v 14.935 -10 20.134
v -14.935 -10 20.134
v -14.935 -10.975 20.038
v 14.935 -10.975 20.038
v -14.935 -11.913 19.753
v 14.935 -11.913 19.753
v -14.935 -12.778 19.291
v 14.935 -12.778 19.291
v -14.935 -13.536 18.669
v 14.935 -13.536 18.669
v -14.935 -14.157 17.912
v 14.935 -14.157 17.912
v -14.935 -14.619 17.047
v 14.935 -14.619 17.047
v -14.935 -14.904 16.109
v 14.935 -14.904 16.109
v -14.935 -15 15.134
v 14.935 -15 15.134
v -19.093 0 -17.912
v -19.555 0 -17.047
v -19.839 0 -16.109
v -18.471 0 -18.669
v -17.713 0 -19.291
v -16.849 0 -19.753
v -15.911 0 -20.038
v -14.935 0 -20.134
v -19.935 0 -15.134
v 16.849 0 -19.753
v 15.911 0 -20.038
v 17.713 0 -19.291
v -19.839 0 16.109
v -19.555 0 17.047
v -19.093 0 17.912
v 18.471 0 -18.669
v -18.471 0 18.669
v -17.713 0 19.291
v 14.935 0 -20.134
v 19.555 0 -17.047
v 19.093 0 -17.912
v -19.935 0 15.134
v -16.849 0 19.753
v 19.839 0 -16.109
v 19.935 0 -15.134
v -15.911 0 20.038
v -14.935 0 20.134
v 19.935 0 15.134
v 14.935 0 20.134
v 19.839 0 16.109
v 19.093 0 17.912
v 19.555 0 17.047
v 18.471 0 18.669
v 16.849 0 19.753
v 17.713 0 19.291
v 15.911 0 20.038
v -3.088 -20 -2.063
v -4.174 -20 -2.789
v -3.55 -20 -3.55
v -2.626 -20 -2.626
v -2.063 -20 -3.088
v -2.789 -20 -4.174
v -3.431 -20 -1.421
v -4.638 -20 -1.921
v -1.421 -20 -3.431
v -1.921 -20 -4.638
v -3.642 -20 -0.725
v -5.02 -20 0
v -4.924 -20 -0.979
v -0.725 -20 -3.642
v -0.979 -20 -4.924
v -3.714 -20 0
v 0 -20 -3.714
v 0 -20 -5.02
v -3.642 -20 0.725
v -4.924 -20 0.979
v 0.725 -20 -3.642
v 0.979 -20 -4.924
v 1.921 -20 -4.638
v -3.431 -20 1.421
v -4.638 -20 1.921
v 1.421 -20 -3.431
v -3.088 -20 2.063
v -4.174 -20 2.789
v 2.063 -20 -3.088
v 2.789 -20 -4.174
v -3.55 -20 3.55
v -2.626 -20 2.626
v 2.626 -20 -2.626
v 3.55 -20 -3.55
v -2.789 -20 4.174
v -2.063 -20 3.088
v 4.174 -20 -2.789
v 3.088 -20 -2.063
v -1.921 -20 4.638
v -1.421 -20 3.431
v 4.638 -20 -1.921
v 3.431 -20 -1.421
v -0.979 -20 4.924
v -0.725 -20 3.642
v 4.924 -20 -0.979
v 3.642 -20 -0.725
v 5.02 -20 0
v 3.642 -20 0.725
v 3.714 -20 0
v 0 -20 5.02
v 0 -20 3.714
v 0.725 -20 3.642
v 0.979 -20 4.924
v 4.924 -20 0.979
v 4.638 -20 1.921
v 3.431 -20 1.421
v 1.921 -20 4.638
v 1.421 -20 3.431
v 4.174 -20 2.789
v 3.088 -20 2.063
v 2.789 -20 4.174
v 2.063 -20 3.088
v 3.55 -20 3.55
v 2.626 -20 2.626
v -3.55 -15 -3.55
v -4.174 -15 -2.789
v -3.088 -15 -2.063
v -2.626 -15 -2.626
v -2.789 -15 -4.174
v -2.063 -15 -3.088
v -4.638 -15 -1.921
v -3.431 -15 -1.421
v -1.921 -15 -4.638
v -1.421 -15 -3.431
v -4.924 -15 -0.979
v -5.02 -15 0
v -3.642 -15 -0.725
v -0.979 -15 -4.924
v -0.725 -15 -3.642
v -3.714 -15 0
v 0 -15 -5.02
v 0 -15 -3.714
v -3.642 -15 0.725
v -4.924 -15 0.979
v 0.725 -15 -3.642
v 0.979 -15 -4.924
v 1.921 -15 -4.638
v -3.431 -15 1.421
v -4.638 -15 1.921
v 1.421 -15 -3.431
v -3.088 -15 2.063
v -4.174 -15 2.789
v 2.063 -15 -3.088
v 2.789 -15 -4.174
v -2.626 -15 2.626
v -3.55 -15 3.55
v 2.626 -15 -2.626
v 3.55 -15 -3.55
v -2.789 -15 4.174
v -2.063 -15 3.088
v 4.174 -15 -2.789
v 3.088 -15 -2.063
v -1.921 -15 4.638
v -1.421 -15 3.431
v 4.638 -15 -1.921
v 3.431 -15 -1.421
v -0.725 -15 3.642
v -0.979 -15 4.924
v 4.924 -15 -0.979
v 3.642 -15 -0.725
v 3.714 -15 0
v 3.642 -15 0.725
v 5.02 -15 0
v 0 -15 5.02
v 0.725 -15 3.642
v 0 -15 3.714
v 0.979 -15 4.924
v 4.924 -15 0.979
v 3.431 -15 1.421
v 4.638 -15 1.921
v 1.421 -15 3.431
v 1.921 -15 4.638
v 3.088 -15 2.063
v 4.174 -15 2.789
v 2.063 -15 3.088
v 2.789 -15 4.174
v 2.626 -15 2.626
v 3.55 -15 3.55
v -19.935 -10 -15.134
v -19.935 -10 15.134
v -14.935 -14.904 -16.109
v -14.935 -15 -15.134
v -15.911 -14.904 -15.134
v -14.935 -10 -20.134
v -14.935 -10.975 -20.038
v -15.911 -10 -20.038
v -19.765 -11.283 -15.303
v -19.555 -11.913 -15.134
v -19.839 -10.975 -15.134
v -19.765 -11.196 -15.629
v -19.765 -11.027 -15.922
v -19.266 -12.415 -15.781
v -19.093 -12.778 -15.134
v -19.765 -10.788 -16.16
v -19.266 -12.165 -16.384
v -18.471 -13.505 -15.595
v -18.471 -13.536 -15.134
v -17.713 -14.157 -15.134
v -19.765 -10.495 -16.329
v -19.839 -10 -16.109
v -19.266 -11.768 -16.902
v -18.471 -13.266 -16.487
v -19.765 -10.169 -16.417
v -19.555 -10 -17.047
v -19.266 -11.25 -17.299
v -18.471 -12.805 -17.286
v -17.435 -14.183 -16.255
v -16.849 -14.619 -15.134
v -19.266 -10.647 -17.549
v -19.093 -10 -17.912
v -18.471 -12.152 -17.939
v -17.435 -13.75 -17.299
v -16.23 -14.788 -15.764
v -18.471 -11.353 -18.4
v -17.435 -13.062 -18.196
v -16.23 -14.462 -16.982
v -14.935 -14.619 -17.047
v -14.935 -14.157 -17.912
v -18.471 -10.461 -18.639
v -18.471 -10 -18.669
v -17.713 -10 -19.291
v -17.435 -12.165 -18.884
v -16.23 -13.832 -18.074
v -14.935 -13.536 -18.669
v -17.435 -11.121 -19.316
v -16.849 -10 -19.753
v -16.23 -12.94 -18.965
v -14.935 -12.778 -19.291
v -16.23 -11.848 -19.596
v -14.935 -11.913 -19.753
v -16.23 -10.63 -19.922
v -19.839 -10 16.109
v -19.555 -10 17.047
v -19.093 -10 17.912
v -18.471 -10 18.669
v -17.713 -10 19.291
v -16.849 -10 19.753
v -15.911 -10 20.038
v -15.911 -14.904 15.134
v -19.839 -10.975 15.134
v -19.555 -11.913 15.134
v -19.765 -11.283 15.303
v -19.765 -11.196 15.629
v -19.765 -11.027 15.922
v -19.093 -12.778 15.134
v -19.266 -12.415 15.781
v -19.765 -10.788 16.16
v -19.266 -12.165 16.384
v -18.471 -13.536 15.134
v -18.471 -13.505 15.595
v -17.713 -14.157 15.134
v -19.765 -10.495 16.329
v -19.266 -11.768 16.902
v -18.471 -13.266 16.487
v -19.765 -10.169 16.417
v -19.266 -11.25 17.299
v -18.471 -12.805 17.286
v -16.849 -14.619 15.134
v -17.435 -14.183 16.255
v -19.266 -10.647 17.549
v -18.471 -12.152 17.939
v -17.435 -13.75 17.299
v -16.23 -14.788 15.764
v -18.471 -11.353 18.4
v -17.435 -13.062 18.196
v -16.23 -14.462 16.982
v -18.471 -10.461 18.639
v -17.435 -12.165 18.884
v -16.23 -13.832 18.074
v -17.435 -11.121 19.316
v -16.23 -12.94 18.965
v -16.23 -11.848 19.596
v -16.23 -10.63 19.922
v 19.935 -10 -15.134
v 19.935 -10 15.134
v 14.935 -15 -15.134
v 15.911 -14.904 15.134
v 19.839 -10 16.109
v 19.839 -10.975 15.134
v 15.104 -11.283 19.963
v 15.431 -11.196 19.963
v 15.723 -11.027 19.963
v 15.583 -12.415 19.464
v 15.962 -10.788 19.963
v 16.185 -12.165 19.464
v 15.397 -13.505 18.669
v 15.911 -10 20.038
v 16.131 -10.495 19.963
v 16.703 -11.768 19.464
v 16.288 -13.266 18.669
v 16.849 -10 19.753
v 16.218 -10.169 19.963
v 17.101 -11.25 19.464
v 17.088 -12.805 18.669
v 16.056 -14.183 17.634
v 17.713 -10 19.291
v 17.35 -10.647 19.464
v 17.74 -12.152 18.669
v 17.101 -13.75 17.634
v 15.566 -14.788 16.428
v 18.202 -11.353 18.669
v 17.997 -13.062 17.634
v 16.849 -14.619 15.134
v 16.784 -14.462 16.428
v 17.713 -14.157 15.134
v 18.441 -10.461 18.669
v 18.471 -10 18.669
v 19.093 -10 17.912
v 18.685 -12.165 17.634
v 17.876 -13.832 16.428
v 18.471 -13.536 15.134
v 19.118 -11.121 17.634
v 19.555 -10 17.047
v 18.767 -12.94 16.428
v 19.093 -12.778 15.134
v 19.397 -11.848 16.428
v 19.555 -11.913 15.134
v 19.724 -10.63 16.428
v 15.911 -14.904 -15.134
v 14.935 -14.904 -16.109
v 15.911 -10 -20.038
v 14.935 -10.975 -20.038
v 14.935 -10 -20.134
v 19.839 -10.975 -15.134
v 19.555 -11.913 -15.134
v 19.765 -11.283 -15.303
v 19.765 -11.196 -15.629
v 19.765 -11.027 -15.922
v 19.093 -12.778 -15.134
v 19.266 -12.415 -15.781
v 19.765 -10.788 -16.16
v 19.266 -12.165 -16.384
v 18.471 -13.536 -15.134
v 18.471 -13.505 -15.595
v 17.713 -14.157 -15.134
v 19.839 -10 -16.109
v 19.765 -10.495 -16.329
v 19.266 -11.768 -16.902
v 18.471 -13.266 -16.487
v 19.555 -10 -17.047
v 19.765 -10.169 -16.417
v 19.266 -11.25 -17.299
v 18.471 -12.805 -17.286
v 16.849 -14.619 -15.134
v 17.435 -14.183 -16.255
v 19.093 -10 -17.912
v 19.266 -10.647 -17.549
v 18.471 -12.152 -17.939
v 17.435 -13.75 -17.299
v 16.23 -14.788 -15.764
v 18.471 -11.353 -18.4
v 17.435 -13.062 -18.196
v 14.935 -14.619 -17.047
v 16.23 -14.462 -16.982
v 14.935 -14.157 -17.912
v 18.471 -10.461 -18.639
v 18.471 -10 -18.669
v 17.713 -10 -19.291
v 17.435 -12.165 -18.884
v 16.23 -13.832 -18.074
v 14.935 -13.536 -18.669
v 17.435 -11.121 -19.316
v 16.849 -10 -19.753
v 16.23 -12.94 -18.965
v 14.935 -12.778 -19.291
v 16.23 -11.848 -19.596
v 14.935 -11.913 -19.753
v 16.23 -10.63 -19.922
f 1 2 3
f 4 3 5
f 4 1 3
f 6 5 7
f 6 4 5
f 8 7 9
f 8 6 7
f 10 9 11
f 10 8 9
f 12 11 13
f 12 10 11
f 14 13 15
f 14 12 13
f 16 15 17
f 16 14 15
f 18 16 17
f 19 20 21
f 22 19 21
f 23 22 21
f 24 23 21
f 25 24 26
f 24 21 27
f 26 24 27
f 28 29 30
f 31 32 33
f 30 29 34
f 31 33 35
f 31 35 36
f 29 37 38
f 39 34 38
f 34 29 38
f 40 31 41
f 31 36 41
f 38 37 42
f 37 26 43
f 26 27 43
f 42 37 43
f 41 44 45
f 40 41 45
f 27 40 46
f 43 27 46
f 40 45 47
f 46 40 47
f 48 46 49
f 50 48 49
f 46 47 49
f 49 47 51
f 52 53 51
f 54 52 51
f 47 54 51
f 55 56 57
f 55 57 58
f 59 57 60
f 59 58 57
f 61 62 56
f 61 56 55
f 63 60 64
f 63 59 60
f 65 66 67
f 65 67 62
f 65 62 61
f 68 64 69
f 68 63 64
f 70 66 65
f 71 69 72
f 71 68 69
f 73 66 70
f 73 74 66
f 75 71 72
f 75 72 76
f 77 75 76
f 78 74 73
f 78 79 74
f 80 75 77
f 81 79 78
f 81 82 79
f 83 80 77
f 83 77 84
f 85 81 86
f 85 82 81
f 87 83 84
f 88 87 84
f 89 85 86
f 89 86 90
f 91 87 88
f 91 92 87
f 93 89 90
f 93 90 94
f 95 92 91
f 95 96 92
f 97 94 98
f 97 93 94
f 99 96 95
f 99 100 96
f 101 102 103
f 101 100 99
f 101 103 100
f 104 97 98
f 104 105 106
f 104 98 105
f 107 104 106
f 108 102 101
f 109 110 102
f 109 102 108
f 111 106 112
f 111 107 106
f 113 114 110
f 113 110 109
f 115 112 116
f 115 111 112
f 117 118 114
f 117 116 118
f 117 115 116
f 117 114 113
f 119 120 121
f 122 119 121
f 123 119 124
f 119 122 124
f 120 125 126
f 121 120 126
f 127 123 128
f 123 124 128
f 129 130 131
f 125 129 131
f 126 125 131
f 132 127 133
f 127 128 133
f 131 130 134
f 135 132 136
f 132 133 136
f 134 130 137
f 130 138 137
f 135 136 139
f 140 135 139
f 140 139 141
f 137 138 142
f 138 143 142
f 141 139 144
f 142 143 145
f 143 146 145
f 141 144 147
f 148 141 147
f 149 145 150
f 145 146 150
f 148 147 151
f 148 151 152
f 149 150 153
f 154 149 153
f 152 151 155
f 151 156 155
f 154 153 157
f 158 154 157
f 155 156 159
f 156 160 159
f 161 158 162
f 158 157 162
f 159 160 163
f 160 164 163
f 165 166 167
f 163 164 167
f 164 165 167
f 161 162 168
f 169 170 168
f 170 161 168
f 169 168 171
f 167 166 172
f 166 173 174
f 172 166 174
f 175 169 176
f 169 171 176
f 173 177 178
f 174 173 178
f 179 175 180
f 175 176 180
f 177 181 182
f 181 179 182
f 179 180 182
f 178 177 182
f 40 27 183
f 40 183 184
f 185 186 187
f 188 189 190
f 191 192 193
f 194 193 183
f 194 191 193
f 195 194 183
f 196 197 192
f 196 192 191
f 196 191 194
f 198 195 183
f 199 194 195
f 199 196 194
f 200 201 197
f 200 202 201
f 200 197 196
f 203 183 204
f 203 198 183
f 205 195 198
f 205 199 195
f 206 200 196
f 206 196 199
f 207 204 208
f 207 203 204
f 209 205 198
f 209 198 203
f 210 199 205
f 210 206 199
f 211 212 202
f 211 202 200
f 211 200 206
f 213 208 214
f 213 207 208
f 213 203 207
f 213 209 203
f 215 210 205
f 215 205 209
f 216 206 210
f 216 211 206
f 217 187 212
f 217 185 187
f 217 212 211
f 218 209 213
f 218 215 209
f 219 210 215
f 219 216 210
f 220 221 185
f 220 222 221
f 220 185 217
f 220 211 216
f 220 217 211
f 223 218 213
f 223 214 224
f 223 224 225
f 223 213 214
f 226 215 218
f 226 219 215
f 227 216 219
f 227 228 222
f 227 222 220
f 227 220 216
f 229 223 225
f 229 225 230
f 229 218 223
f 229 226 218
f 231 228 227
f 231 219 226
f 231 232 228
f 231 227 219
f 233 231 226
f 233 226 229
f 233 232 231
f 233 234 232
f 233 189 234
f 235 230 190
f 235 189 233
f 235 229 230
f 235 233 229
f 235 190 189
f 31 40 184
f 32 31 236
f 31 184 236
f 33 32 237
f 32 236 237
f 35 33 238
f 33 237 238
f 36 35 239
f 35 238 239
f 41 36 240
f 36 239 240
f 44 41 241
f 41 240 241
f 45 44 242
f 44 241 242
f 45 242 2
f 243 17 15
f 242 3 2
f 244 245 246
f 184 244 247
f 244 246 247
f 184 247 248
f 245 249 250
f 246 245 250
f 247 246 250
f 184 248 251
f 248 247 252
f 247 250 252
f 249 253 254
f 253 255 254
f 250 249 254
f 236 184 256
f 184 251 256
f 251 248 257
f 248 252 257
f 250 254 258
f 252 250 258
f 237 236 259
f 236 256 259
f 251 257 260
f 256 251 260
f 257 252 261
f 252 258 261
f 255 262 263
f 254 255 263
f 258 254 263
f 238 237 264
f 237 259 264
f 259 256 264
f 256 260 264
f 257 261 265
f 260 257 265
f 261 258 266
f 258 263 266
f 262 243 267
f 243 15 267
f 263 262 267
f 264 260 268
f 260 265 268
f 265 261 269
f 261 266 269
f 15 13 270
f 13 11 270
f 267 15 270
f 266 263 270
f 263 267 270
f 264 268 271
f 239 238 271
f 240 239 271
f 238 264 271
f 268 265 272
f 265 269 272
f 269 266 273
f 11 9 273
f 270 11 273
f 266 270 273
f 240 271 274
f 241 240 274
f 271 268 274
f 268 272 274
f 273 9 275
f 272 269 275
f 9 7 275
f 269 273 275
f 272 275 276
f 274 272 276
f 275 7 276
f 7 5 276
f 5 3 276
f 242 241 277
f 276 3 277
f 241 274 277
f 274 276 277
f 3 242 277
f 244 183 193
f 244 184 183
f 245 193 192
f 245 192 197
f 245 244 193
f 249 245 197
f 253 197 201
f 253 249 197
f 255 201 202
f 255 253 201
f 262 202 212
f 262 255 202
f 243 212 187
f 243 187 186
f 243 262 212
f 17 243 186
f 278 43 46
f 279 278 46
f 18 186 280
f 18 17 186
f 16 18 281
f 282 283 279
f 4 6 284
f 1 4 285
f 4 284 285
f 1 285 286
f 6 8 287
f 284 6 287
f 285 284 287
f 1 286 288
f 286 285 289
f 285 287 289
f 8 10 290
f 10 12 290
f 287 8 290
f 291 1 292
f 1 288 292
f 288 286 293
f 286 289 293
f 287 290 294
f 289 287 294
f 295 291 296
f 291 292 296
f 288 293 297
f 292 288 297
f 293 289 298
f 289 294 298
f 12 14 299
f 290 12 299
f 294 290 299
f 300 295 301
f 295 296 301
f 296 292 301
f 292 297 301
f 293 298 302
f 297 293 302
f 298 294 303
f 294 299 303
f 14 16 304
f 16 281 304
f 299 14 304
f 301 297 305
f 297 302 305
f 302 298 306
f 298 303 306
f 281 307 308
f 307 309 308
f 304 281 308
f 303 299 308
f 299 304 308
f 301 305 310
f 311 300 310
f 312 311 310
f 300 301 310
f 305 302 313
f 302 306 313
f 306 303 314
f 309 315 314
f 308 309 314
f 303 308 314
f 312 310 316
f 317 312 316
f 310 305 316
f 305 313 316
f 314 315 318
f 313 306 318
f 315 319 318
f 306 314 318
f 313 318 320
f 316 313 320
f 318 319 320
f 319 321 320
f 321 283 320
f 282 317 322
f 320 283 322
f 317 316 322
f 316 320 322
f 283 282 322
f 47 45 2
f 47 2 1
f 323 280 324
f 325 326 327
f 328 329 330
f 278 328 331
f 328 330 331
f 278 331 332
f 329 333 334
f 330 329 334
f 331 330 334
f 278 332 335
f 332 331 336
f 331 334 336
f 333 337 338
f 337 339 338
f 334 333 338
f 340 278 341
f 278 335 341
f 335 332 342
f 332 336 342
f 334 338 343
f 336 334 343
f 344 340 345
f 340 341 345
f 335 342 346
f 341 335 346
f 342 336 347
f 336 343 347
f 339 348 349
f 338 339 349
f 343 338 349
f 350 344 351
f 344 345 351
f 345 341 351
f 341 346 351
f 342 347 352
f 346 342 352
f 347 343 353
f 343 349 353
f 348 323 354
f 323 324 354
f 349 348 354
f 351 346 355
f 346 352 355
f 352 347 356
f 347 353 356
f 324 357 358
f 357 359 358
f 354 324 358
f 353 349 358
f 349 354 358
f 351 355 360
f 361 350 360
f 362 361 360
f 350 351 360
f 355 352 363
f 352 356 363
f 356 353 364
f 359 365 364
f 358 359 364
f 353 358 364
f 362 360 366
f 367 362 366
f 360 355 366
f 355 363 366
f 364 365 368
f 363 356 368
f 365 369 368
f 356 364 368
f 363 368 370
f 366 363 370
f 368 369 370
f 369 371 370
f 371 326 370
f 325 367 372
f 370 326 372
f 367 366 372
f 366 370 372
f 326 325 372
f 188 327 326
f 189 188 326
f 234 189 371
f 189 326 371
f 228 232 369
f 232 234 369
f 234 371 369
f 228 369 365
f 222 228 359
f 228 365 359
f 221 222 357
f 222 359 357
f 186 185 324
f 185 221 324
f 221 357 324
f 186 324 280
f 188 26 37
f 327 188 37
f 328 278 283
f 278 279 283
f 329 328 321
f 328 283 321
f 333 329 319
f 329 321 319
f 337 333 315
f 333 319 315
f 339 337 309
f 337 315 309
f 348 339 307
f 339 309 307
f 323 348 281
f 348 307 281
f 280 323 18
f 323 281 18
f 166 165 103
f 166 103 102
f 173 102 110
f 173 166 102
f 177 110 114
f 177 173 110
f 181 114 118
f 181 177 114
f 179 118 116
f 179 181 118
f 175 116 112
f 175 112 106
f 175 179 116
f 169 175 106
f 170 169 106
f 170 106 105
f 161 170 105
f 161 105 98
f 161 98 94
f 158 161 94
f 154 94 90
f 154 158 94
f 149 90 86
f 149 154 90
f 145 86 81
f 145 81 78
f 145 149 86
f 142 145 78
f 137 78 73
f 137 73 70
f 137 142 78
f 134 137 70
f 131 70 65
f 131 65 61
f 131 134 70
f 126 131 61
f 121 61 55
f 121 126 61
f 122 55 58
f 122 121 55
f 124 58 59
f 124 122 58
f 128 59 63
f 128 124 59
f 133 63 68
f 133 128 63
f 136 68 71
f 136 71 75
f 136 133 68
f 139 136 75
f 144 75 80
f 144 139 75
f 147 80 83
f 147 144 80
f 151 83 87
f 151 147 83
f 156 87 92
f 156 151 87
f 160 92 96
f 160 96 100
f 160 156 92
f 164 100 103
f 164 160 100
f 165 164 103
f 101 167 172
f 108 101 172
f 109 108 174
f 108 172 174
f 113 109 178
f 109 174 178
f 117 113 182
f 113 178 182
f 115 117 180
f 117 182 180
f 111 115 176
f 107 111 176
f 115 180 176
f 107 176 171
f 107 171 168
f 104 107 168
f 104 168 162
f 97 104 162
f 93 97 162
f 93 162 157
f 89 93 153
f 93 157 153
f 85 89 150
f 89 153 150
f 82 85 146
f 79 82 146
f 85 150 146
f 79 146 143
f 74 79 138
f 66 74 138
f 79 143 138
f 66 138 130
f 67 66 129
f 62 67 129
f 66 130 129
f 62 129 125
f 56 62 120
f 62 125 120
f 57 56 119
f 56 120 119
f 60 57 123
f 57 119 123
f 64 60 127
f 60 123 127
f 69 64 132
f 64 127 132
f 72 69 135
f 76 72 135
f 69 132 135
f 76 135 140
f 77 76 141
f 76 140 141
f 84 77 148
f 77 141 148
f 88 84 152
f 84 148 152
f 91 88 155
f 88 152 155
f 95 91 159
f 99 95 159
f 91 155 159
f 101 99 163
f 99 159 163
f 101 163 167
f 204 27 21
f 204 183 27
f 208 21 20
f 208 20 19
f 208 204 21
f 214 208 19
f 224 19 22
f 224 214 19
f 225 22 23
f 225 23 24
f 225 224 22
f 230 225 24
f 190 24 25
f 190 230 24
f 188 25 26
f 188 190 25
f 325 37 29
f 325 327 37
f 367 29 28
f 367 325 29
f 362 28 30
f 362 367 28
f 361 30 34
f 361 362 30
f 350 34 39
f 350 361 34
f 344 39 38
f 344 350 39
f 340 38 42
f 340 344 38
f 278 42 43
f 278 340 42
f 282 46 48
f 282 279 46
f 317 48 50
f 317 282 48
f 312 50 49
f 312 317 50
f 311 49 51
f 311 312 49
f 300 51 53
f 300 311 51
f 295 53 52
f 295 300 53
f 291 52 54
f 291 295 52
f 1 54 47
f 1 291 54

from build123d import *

# Parameters (mm, degrees)
F0_W     = 39.870906
F0_H     = 40.267636
F1_DEPTH = 15
F2_R     = 5
F3_R     = 5.020385
F3_R_2   = 3.713676
F4_DEPTH = 5


with BuildPart() as f1:
    # F0 (on Front) → F1 (new body)
    with BuildSketch(Plane.XZ):
        Rectangle(F0_W, F0_H)
    extrude(amount=F1_DEPTH)

    # F2
    f2_edges = [f1.edges().sort_by_distance(p)[0] for p in [
        (0, -15, -20.133818),
        (19.935453, -15, 0),
        (0, -15, 20.133818),
        (-19.935453, -15, 0),
        (-19.935453, -7.5, -20.133818),
        (-19.935453, -7.5, 20.133818),
        (19.935453, -7.5, -20.133818),
        (19.935453, -7.5, 20.133818),
    ]]
    fillet(f2_edges, radius=F2_R)


with BuildPart() as f4:
    # F3 (on face) → F4 (new body)
    with BuildSketch(Plane.XZ.offset(15)):
        Circle(F3_R)
        Circle(F3_R_2, mode=Mode.SUBTRACT)
    extrude(amount=F4_DEPTH)


solid = Compound([f1.part, f4.part])
